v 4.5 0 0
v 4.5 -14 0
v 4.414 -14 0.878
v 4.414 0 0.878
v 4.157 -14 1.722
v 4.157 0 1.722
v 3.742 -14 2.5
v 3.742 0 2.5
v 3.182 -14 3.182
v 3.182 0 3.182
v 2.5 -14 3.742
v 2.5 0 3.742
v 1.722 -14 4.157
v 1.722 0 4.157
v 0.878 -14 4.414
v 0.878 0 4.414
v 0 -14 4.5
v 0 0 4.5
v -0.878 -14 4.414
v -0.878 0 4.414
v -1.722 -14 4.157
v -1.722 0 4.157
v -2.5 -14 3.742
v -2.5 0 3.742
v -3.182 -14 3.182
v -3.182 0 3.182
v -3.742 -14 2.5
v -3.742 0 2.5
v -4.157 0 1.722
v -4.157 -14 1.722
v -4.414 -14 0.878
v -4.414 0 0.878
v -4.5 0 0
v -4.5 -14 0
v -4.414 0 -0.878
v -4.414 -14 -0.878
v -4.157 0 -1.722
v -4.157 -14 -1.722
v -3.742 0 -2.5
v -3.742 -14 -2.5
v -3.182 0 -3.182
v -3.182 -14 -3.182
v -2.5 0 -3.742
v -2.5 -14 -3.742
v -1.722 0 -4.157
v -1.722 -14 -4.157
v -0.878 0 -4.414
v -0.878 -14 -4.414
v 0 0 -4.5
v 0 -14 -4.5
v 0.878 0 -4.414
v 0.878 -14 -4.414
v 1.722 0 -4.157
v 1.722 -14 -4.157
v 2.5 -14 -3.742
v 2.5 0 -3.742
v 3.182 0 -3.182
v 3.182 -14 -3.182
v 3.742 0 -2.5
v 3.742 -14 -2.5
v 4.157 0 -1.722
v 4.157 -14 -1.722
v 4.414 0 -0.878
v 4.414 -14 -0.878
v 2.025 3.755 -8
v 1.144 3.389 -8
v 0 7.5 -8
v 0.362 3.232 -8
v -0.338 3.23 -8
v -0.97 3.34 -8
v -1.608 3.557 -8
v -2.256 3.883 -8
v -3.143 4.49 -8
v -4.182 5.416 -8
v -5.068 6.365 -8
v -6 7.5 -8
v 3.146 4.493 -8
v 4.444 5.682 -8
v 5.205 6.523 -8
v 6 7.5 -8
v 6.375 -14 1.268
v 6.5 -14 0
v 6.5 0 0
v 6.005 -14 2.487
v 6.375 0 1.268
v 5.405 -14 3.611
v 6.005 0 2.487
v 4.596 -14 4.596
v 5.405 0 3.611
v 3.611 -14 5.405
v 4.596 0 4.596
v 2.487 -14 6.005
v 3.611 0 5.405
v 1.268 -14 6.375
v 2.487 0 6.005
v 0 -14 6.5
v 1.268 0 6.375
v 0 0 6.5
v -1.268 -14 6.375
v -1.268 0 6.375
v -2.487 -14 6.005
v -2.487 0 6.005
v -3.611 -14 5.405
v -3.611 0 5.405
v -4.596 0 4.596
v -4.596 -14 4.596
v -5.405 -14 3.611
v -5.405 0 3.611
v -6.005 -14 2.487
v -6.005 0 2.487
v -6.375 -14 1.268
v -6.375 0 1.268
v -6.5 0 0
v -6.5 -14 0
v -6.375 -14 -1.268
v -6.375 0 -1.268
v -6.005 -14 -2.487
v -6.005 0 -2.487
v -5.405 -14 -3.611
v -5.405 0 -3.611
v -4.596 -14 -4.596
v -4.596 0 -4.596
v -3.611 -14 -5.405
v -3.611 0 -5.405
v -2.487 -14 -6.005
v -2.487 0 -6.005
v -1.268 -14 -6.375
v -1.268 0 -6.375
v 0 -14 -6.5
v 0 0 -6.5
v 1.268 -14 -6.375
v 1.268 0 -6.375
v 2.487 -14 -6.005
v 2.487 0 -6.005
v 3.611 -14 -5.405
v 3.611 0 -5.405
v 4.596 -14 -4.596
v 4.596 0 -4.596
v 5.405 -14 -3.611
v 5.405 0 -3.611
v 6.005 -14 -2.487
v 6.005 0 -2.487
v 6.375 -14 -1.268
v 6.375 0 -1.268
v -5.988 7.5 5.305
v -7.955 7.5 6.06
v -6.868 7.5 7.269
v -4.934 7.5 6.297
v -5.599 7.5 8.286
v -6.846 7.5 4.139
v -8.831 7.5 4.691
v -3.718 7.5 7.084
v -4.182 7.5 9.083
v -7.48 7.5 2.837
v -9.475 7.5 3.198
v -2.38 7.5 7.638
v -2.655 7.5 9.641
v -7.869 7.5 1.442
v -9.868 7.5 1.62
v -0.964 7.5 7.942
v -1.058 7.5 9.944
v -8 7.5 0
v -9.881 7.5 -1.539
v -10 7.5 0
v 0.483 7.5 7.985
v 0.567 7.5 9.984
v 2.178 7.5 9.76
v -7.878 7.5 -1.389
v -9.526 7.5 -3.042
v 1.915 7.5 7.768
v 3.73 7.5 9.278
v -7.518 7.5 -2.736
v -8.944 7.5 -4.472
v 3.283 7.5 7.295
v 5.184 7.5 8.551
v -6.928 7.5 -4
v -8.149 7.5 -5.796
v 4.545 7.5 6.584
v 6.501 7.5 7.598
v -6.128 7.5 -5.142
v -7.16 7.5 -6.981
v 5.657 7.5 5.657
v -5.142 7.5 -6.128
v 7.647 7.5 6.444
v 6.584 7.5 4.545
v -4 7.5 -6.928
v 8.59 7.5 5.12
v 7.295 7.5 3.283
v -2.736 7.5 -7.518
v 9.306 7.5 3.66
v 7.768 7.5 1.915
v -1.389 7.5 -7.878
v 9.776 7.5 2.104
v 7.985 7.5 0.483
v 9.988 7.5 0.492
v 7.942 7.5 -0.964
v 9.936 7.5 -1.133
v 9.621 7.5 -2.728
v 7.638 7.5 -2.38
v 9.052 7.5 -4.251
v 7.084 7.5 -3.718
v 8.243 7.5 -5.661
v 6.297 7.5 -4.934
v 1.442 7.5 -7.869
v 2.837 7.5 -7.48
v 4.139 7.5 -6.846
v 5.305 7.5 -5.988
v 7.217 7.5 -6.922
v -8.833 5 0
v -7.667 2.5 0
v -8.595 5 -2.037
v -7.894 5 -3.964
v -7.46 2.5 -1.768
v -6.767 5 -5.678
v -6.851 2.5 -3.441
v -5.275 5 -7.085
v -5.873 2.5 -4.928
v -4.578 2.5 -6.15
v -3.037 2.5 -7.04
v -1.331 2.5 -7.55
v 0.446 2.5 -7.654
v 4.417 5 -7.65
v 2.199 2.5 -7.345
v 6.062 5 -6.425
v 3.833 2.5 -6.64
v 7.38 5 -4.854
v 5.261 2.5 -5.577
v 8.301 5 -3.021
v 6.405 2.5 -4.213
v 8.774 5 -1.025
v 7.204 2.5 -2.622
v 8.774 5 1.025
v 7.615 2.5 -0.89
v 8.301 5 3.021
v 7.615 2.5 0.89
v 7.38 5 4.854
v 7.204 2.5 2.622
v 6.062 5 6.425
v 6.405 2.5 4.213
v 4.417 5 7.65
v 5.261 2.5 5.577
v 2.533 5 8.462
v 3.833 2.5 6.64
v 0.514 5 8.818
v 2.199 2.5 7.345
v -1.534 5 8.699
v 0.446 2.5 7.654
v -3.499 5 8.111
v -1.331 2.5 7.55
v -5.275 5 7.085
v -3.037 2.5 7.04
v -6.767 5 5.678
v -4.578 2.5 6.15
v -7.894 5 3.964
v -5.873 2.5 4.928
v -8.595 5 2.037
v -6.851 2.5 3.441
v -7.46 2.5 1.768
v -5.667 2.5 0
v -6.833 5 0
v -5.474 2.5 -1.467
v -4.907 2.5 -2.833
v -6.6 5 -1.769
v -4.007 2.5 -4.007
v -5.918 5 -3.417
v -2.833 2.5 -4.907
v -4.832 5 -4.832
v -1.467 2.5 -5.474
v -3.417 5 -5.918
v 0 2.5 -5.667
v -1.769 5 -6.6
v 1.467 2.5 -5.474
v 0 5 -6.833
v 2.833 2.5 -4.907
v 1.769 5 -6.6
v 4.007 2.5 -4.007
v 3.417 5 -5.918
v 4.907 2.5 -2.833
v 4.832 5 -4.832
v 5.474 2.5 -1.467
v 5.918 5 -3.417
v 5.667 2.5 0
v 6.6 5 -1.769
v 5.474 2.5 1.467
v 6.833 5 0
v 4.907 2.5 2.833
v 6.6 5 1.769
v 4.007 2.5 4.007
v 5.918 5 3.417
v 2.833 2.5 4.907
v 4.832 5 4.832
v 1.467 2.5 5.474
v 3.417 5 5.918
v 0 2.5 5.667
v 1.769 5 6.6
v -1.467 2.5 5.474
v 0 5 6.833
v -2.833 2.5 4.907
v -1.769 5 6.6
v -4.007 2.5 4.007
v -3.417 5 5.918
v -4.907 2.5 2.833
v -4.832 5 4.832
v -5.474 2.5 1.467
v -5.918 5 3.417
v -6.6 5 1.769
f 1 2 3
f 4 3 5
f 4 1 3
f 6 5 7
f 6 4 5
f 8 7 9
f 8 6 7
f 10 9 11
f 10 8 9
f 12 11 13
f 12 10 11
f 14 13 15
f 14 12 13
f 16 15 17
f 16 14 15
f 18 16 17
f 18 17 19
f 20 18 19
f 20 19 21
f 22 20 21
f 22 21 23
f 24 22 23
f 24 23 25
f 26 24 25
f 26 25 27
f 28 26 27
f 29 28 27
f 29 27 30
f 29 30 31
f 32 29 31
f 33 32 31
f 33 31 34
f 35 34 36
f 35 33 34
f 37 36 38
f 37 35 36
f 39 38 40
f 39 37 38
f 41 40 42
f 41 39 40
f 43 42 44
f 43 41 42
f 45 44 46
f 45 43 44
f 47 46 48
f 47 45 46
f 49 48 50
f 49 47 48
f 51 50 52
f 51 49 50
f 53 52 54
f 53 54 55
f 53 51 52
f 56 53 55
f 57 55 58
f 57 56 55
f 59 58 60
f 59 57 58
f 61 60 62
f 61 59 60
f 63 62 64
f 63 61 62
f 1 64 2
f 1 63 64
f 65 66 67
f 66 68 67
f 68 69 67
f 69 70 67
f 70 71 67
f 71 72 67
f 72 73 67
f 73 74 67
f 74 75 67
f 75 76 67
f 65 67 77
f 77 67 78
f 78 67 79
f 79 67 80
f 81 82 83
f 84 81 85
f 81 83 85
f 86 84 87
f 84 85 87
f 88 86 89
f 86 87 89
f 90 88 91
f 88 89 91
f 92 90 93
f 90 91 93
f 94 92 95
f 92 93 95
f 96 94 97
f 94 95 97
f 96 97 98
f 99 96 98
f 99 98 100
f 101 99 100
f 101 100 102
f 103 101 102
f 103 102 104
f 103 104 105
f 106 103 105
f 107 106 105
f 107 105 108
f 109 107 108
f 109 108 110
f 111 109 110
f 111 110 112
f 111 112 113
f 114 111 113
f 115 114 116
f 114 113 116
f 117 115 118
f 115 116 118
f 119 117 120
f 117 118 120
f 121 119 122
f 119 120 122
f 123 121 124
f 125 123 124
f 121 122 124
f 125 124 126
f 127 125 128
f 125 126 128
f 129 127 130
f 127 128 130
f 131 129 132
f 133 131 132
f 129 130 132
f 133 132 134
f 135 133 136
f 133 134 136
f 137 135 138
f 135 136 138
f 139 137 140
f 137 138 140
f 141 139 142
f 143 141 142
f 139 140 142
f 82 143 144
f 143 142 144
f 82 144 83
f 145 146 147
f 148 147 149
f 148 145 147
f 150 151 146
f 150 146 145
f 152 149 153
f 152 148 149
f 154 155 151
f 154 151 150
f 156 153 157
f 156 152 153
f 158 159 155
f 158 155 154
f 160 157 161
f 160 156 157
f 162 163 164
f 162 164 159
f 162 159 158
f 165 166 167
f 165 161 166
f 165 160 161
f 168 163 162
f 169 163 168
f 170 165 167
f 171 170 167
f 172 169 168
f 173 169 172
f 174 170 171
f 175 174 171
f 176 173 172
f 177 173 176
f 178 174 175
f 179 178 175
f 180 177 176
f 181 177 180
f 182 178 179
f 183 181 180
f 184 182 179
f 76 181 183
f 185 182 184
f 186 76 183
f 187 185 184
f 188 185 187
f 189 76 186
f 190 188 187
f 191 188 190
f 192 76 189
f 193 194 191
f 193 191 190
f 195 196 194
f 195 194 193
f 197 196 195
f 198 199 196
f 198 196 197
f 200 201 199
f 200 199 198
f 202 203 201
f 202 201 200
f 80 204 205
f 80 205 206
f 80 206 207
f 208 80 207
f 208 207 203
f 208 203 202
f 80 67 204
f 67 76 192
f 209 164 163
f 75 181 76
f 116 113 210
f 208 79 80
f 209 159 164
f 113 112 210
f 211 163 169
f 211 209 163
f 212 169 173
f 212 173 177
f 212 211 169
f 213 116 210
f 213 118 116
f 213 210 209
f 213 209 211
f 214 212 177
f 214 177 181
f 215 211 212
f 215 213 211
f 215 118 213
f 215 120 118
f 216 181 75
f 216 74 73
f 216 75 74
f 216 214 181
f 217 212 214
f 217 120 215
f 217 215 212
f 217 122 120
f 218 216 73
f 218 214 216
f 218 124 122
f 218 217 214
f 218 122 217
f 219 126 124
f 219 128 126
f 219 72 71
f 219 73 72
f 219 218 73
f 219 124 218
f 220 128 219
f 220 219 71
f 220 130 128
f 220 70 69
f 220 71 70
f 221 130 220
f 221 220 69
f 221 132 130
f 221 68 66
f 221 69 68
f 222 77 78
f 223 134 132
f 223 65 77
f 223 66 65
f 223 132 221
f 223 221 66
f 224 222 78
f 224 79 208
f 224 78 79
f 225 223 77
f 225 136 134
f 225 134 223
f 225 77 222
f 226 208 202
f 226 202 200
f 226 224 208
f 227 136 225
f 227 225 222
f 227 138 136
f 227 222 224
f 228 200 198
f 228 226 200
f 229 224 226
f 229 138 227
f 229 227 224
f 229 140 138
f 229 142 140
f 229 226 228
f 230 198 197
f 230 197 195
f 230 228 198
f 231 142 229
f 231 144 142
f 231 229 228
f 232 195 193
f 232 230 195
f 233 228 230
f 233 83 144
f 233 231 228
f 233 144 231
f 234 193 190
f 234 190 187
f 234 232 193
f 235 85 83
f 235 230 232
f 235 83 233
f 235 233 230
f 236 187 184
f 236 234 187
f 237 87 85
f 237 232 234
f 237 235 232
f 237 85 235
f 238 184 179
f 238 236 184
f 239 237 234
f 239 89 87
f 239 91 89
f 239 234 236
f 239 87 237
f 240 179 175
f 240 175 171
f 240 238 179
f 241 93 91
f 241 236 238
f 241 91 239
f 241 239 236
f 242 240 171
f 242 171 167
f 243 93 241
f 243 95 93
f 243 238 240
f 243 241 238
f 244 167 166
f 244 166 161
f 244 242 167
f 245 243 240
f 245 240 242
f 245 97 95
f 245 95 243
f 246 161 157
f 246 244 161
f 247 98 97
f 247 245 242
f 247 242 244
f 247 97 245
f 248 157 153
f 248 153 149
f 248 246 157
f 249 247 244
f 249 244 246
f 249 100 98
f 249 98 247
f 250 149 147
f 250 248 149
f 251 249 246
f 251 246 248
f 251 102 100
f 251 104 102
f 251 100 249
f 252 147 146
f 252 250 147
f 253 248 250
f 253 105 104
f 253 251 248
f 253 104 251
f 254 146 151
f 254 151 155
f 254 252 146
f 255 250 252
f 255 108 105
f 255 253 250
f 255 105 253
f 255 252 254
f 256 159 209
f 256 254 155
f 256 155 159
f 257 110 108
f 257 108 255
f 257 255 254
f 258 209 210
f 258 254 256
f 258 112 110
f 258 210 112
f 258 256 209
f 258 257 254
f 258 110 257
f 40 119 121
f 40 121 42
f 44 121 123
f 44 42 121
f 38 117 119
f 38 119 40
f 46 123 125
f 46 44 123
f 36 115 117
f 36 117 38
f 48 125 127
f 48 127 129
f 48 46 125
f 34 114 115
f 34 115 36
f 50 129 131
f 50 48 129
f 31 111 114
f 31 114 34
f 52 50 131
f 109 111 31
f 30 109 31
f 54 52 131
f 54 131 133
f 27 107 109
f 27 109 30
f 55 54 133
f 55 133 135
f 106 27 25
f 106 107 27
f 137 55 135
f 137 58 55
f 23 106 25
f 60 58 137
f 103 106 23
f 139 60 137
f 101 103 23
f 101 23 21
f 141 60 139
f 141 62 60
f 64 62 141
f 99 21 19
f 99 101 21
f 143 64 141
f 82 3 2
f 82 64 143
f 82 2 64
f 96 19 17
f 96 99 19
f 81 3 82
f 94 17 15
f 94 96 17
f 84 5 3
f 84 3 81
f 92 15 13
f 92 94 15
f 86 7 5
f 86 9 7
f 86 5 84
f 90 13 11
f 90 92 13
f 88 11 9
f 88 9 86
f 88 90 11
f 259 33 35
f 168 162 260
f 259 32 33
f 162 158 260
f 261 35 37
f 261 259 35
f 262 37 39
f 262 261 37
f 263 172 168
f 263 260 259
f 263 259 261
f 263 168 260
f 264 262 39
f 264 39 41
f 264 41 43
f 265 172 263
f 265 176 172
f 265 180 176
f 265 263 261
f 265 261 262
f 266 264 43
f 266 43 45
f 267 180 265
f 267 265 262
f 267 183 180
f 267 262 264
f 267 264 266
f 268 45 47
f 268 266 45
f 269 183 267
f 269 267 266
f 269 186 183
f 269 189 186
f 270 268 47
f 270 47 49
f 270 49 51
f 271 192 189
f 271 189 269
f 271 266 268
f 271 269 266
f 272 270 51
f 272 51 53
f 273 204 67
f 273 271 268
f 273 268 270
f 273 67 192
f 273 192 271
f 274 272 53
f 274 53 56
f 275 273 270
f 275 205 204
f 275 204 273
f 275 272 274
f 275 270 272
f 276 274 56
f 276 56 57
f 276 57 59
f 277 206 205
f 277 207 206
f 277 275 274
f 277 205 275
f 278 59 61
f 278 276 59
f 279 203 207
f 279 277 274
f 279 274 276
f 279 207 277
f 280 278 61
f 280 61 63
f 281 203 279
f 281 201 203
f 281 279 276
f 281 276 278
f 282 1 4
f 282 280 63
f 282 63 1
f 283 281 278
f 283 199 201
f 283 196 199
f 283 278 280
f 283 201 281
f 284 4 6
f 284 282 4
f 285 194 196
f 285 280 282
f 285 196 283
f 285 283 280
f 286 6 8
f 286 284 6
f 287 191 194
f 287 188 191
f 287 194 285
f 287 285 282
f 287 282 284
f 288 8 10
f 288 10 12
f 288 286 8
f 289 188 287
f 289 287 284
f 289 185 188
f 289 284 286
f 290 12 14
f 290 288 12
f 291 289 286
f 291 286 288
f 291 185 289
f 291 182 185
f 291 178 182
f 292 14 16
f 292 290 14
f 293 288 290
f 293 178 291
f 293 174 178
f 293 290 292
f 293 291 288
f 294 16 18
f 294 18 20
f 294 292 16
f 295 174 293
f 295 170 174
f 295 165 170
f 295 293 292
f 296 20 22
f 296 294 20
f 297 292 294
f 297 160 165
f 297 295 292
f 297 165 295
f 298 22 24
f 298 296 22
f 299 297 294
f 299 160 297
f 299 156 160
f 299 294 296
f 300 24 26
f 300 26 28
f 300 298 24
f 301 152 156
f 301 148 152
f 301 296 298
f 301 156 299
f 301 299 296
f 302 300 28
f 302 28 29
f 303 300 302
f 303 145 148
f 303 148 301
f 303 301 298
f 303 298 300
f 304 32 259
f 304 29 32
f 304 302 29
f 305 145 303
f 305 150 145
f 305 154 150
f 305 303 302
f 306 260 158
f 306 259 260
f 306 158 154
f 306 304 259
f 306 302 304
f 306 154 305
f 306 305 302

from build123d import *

# Parameters (mm, degrees)
CROQUIS3_R              = 6.5
CROQUIS3_R_2            = 4.5
SALIENTE_EXTRUIR1_DEPTH = 14
CROQUIS4_W              = 14.224697916
CROQUIS4_H              = 2.830487819
CORTAR_EXTRUIR1_DEPTH   = 7.5


with BuildPart() as part:
    # Croquis2 → Revolución1 (revolve)
    with BuildSketch(Plane.XY):
        Polygon((-4.5, 0), (-8, 7.5), (-10, 7.5), (-6.5, 0), align=None)
    revolve(axis=Axis((0, 7.5, 0), (0, -1, 0)))

    # Croquis3 → Saliente-Extruir1 (add)
    with BuildSketch(Plane.XZ):
        Circle(CROQUIS3_R)
        Circle(CROQUIS3_R_2, mode=Mode.SUBTRACT)
    extrude(amount=SALIENTE_EXTRUIR1_DEPTH)

    # Croquis4 → Cortar-Extruir1 (cut)
    with BuildSketch(Plane(origin=(0, 7.5, 0), x_dir=(1, 0, 0), z_dir=(0, 1, 0))):
        with Locations((0, 9.415243909)):
            Rectangle(CROQUIS4_W, CROQUIS4_H)
    extrude(amount=-CORTAR_EXTRUIR1_DEPTH, mode=Mode.SUBTRACT)


solid = part.part
